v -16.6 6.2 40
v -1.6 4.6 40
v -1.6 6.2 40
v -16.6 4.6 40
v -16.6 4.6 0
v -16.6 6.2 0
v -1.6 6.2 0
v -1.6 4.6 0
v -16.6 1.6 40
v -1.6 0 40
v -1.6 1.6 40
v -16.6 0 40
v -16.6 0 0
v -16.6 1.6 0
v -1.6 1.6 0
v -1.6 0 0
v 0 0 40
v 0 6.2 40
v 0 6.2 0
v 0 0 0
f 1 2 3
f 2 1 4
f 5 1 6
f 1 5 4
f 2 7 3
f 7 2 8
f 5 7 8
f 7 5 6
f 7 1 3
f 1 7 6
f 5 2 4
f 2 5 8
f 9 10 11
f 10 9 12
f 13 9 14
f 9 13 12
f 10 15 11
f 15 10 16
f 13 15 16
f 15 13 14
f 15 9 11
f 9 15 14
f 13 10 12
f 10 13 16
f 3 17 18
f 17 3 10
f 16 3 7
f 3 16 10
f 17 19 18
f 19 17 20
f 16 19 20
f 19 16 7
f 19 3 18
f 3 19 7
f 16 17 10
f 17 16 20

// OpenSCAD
h_blind=3;
th=1.6;

y = 2*th + h_blind;
x = 40;
z = 15;

module U() {
cube([x, y, th]);
translate([0, 0, th]) {
translate([0, h_blind+th, 0])
  #cube([x, th, z]);
  cube([x, th, z]);
}
}
rotate([0, -90, 0])
U();
